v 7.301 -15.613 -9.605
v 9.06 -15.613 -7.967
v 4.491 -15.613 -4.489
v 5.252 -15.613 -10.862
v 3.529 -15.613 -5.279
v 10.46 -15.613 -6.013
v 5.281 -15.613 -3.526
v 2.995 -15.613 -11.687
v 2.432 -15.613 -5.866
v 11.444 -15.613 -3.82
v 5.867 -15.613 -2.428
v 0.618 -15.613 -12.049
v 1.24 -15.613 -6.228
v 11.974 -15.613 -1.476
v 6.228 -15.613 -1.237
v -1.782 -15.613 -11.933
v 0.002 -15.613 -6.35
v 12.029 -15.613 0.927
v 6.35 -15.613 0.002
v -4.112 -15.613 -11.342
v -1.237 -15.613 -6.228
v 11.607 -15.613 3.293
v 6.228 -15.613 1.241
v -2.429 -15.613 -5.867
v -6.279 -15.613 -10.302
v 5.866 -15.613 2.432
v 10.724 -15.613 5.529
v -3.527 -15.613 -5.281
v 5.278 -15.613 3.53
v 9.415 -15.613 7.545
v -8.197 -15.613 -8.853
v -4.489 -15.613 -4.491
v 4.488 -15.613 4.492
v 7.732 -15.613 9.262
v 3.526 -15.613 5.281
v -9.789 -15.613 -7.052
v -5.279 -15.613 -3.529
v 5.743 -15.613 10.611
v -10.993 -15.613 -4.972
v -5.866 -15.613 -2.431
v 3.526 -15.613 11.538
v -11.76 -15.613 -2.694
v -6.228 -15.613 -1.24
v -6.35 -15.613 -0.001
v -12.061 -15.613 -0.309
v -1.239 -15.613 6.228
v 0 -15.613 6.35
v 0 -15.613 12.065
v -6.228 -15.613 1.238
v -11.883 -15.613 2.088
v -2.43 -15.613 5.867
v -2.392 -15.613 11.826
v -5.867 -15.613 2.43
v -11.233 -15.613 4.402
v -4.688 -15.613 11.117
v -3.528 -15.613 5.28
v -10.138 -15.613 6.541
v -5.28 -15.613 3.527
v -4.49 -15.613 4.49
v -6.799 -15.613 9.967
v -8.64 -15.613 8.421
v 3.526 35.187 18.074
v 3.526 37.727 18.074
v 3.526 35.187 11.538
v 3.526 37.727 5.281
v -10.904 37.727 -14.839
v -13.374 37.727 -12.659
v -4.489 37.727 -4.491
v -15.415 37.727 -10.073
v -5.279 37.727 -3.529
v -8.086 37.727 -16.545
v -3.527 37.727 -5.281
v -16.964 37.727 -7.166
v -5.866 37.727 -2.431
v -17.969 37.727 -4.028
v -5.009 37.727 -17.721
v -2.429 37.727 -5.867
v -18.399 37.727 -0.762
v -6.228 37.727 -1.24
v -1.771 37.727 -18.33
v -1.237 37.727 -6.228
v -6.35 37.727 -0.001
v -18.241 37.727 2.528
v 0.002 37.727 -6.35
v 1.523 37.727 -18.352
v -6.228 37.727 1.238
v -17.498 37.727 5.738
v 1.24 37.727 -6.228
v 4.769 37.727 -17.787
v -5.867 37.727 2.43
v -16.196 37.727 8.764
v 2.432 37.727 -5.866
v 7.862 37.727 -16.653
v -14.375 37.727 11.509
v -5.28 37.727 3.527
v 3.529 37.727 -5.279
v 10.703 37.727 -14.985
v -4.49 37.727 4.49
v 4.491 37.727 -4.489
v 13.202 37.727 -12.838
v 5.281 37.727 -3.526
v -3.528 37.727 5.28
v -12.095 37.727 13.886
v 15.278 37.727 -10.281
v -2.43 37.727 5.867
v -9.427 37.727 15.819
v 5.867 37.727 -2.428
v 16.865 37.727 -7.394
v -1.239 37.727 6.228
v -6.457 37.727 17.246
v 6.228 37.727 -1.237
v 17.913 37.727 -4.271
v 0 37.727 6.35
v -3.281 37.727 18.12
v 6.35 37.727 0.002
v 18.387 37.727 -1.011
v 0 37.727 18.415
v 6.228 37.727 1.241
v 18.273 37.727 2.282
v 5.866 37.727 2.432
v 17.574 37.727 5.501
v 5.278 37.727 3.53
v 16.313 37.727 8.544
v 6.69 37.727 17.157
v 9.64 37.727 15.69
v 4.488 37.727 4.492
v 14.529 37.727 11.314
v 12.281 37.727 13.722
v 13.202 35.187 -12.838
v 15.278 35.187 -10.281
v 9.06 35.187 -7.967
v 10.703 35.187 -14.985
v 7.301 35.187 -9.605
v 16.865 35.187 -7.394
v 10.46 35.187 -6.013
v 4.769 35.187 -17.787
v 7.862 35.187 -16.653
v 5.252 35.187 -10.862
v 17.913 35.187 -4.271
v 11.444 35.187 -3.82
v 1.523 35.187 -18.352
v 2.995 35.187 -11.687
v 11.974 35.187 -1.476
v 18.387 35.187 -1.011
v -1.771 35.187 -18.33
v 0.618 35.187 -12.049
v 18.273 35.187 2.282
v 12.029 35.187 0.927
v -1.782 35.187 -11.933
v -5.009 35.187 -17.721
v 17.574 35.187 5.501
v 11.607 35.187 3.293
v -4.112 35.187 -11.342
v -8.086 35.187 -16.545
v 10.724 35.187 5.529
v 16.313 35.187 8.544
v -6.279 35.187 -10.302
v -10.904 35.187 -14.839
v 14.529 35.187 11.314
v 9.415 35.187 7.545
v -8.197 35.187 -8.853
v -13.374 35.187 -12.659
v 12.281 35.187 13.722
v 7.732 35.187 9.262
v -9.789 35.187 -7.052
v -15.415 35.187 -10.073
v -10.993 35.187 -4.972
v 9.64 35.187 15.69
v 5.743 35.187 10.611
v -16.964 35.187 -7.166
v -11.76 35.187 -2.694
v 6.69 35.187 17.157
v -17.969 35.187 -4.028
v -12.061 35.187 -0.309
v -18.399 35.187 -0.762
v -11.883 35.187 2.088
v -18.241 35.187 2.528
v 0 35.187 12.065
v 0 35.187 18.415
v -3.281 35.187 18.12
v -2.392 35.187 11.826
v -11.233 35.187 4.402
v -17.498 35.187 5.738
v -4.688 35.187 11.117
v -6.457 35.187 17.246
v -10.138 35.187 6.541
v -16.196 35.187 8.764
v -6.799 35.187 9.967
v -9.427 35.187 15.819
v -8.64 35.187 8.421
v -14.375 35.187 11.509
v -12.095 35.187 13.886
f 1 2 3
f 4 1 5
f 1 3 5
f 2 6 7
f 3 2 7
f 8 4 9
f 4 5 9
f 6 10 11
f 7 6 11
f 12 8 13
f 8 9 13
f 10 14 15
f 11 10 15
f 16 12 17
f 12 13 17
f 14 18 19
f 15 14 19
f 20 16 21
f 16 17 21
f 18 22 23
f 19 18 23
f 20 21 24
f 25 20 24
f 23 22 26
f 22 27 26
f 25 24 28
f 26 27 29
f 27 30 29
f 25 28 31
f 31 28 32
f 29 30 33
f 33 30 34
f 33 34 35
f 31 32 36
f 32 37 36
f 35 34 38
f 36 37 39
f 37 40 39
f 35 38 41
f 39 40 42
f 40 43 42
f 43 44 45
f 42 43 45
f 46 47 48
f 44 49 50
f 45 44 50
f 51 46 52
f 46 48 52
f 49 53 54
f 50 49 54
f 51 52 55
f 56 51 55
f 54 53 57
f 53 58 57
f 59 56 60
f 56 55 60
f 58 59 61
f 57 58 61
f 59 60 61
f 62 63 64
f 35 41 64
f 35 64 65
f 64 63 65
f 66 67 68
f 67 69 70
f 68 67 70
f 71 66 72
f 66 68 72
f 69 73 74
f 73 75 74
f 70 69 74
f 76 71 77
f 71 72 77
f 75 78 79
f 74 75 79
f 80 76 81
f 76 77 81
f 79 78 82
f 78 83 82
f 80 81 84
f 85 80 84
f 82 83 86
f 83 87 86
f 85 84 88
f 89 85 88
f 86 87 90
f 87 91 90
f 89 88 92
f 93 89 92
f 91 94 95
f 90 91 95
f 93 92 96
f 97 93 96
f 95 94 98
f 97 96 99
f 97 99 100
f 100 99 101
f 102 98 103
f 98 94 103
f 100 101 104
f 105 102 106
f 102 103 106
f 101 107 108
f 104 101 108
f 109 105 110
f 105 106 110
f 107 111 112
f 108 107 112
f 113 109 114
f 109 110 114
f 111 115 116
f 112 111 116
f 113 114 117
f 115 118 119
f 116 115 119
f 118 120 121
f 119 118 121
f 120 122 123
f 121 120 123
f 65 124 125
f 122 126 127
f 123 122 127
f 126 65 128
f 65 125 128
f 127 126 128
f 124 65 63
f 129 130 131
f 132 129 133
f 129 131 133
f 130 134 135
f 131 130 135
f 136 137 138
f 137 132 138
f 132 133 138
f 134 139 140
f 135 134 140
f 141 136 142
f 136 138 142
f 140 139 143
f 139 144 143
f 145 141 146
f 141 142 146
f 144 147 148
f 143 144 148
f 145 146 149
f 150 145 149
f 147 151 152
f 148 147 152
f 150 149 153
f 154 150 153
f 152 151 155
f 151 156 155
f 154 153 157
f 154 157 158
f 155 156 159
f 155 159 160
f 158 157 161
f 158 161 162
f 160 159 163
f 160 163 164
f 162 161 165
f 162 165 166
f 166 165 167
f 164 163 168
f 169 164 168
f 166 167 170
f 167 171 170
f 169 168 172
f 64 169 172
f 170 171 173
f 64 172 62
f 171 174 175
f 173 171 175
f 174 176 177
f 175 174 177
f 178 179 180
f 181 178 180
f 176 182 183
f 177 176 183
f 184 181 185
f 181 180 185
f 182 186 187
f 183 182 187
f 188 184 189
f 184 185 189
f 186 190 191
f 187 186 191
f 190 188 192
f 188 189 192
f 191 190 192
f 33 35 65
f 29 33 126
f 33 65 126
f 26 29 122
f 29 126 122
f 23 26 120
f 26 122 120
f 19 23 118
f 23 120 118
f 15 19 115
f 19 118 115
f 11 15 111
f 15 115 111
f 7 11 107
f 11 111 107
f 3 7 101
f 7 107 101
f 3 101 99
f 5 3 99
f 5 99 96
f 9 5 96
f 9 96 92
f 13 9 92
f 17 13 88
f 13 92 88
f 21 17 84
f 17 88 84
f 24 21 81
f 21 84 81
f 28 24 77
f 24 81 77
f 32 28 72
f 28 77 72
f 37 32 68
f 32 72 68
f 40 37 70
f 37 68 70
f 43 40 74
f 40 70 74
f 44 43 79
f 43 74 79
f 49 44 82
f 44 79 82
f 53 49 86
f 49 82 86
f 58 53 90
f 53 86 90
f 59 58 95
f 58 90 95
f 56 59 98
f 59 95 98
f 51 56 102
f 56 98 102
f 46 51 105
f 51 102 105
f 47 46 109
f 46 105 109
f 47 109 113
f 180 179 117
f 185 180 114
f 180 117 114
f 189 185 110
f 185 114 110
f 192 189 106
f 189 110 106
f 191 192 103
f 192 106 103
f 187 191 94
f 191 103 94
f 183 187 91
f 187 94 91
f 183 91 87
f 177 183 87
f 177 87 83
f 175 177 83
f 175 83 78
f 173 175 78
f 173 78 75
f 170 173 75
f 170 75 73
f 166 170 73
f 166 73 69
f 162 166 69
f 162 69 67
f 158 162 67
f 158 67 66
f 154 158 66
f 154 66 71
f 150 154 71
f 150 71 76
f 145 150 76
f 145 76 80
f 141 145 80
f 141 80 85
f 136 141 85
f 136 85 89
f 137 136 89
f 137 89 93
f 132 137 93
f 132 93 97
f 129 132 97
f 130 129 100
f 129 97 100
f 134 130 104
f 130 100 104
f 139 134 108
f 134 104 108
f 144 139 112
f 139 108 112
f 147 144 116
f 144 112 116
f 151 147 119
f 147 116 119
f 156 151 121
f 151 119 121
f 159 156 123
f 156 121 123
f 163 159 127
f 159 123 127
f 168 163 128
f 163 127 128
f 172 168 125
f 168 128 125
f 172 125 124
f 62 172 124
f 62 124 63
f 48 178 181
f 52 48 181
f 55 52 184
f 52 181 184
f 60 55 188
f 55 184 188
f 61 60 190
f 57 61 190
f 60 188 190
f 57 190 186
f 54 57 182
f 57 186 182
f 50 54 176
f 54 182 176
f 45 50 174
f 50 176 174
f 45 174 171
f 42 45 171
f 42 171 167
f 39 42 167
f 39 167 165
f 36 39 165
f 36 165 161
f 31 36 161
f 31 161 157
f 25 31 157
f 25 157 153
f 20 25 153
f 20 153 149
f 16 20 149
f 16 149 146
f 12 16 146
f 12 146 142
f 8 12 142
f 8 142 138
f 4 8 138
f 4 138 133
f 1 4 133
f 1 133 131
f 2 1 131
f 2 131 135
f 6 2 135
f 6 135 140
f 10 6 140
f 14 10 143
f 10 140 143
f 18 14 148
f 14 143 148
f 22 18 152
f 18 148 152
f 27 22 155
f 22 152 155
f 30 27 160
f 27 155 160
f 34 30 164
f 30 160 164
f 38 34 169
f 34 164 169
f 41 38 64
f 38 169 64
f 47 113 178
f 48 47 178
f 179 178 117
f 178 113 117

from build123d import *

# Parameters (mm, degrees)
F2_R     = 6.35
F3_DEPTH = 101.6
F5_DEPTH = 127


with BuildPart() as f1:
    # F0 (on Top) → F1 (revolve)
    with BuildSketch(Plane.XY):
        Polygon((0, 37.726658), (0, -15.613342), (12.065, -15.613342), (12.065, 35.186658), (18.415, 35.186658), (18.415, 37.726658), align=None)
    revolve(axis=Axis((0, 11.056658, 0), (0, -1, 0)))

    # F2 (on face) → F3 (cut)
    with BuildSketch(Plane(origin=(0, 37.726658, 0), x_dir=(-1, 0, 0), z_dir=(0, 1, 0))):
        Circle(F2_R)
    extrude(amount=-F3_DEPTH, mode=Mode.SUBTRACT)

    # F4 (on face) → F5 (cut)
    with BuildSketch(Plane(origin=(0, 37.726658, 0), x_dir=(-1, 0, 0), z_dir=(0, 1, 0))):
        with BuildLine():
            Line((0, 6.35), (0, 18.415))
            ThreePointArc((0, 18.415), (-1.770995, 18.329643), (-3.525572, 18.074362))
            Line((-3.525572, 18.074362), (-3.525572, 5.281367))
            ThreePointArc((-3.525572, 5.281367), (-1.841985, 6.076972), (0, 6.35))
        make_face()
    extrude(amount=-F5_DEPTH, mode=Mode.SUBTRACT)


solid = f1.part
